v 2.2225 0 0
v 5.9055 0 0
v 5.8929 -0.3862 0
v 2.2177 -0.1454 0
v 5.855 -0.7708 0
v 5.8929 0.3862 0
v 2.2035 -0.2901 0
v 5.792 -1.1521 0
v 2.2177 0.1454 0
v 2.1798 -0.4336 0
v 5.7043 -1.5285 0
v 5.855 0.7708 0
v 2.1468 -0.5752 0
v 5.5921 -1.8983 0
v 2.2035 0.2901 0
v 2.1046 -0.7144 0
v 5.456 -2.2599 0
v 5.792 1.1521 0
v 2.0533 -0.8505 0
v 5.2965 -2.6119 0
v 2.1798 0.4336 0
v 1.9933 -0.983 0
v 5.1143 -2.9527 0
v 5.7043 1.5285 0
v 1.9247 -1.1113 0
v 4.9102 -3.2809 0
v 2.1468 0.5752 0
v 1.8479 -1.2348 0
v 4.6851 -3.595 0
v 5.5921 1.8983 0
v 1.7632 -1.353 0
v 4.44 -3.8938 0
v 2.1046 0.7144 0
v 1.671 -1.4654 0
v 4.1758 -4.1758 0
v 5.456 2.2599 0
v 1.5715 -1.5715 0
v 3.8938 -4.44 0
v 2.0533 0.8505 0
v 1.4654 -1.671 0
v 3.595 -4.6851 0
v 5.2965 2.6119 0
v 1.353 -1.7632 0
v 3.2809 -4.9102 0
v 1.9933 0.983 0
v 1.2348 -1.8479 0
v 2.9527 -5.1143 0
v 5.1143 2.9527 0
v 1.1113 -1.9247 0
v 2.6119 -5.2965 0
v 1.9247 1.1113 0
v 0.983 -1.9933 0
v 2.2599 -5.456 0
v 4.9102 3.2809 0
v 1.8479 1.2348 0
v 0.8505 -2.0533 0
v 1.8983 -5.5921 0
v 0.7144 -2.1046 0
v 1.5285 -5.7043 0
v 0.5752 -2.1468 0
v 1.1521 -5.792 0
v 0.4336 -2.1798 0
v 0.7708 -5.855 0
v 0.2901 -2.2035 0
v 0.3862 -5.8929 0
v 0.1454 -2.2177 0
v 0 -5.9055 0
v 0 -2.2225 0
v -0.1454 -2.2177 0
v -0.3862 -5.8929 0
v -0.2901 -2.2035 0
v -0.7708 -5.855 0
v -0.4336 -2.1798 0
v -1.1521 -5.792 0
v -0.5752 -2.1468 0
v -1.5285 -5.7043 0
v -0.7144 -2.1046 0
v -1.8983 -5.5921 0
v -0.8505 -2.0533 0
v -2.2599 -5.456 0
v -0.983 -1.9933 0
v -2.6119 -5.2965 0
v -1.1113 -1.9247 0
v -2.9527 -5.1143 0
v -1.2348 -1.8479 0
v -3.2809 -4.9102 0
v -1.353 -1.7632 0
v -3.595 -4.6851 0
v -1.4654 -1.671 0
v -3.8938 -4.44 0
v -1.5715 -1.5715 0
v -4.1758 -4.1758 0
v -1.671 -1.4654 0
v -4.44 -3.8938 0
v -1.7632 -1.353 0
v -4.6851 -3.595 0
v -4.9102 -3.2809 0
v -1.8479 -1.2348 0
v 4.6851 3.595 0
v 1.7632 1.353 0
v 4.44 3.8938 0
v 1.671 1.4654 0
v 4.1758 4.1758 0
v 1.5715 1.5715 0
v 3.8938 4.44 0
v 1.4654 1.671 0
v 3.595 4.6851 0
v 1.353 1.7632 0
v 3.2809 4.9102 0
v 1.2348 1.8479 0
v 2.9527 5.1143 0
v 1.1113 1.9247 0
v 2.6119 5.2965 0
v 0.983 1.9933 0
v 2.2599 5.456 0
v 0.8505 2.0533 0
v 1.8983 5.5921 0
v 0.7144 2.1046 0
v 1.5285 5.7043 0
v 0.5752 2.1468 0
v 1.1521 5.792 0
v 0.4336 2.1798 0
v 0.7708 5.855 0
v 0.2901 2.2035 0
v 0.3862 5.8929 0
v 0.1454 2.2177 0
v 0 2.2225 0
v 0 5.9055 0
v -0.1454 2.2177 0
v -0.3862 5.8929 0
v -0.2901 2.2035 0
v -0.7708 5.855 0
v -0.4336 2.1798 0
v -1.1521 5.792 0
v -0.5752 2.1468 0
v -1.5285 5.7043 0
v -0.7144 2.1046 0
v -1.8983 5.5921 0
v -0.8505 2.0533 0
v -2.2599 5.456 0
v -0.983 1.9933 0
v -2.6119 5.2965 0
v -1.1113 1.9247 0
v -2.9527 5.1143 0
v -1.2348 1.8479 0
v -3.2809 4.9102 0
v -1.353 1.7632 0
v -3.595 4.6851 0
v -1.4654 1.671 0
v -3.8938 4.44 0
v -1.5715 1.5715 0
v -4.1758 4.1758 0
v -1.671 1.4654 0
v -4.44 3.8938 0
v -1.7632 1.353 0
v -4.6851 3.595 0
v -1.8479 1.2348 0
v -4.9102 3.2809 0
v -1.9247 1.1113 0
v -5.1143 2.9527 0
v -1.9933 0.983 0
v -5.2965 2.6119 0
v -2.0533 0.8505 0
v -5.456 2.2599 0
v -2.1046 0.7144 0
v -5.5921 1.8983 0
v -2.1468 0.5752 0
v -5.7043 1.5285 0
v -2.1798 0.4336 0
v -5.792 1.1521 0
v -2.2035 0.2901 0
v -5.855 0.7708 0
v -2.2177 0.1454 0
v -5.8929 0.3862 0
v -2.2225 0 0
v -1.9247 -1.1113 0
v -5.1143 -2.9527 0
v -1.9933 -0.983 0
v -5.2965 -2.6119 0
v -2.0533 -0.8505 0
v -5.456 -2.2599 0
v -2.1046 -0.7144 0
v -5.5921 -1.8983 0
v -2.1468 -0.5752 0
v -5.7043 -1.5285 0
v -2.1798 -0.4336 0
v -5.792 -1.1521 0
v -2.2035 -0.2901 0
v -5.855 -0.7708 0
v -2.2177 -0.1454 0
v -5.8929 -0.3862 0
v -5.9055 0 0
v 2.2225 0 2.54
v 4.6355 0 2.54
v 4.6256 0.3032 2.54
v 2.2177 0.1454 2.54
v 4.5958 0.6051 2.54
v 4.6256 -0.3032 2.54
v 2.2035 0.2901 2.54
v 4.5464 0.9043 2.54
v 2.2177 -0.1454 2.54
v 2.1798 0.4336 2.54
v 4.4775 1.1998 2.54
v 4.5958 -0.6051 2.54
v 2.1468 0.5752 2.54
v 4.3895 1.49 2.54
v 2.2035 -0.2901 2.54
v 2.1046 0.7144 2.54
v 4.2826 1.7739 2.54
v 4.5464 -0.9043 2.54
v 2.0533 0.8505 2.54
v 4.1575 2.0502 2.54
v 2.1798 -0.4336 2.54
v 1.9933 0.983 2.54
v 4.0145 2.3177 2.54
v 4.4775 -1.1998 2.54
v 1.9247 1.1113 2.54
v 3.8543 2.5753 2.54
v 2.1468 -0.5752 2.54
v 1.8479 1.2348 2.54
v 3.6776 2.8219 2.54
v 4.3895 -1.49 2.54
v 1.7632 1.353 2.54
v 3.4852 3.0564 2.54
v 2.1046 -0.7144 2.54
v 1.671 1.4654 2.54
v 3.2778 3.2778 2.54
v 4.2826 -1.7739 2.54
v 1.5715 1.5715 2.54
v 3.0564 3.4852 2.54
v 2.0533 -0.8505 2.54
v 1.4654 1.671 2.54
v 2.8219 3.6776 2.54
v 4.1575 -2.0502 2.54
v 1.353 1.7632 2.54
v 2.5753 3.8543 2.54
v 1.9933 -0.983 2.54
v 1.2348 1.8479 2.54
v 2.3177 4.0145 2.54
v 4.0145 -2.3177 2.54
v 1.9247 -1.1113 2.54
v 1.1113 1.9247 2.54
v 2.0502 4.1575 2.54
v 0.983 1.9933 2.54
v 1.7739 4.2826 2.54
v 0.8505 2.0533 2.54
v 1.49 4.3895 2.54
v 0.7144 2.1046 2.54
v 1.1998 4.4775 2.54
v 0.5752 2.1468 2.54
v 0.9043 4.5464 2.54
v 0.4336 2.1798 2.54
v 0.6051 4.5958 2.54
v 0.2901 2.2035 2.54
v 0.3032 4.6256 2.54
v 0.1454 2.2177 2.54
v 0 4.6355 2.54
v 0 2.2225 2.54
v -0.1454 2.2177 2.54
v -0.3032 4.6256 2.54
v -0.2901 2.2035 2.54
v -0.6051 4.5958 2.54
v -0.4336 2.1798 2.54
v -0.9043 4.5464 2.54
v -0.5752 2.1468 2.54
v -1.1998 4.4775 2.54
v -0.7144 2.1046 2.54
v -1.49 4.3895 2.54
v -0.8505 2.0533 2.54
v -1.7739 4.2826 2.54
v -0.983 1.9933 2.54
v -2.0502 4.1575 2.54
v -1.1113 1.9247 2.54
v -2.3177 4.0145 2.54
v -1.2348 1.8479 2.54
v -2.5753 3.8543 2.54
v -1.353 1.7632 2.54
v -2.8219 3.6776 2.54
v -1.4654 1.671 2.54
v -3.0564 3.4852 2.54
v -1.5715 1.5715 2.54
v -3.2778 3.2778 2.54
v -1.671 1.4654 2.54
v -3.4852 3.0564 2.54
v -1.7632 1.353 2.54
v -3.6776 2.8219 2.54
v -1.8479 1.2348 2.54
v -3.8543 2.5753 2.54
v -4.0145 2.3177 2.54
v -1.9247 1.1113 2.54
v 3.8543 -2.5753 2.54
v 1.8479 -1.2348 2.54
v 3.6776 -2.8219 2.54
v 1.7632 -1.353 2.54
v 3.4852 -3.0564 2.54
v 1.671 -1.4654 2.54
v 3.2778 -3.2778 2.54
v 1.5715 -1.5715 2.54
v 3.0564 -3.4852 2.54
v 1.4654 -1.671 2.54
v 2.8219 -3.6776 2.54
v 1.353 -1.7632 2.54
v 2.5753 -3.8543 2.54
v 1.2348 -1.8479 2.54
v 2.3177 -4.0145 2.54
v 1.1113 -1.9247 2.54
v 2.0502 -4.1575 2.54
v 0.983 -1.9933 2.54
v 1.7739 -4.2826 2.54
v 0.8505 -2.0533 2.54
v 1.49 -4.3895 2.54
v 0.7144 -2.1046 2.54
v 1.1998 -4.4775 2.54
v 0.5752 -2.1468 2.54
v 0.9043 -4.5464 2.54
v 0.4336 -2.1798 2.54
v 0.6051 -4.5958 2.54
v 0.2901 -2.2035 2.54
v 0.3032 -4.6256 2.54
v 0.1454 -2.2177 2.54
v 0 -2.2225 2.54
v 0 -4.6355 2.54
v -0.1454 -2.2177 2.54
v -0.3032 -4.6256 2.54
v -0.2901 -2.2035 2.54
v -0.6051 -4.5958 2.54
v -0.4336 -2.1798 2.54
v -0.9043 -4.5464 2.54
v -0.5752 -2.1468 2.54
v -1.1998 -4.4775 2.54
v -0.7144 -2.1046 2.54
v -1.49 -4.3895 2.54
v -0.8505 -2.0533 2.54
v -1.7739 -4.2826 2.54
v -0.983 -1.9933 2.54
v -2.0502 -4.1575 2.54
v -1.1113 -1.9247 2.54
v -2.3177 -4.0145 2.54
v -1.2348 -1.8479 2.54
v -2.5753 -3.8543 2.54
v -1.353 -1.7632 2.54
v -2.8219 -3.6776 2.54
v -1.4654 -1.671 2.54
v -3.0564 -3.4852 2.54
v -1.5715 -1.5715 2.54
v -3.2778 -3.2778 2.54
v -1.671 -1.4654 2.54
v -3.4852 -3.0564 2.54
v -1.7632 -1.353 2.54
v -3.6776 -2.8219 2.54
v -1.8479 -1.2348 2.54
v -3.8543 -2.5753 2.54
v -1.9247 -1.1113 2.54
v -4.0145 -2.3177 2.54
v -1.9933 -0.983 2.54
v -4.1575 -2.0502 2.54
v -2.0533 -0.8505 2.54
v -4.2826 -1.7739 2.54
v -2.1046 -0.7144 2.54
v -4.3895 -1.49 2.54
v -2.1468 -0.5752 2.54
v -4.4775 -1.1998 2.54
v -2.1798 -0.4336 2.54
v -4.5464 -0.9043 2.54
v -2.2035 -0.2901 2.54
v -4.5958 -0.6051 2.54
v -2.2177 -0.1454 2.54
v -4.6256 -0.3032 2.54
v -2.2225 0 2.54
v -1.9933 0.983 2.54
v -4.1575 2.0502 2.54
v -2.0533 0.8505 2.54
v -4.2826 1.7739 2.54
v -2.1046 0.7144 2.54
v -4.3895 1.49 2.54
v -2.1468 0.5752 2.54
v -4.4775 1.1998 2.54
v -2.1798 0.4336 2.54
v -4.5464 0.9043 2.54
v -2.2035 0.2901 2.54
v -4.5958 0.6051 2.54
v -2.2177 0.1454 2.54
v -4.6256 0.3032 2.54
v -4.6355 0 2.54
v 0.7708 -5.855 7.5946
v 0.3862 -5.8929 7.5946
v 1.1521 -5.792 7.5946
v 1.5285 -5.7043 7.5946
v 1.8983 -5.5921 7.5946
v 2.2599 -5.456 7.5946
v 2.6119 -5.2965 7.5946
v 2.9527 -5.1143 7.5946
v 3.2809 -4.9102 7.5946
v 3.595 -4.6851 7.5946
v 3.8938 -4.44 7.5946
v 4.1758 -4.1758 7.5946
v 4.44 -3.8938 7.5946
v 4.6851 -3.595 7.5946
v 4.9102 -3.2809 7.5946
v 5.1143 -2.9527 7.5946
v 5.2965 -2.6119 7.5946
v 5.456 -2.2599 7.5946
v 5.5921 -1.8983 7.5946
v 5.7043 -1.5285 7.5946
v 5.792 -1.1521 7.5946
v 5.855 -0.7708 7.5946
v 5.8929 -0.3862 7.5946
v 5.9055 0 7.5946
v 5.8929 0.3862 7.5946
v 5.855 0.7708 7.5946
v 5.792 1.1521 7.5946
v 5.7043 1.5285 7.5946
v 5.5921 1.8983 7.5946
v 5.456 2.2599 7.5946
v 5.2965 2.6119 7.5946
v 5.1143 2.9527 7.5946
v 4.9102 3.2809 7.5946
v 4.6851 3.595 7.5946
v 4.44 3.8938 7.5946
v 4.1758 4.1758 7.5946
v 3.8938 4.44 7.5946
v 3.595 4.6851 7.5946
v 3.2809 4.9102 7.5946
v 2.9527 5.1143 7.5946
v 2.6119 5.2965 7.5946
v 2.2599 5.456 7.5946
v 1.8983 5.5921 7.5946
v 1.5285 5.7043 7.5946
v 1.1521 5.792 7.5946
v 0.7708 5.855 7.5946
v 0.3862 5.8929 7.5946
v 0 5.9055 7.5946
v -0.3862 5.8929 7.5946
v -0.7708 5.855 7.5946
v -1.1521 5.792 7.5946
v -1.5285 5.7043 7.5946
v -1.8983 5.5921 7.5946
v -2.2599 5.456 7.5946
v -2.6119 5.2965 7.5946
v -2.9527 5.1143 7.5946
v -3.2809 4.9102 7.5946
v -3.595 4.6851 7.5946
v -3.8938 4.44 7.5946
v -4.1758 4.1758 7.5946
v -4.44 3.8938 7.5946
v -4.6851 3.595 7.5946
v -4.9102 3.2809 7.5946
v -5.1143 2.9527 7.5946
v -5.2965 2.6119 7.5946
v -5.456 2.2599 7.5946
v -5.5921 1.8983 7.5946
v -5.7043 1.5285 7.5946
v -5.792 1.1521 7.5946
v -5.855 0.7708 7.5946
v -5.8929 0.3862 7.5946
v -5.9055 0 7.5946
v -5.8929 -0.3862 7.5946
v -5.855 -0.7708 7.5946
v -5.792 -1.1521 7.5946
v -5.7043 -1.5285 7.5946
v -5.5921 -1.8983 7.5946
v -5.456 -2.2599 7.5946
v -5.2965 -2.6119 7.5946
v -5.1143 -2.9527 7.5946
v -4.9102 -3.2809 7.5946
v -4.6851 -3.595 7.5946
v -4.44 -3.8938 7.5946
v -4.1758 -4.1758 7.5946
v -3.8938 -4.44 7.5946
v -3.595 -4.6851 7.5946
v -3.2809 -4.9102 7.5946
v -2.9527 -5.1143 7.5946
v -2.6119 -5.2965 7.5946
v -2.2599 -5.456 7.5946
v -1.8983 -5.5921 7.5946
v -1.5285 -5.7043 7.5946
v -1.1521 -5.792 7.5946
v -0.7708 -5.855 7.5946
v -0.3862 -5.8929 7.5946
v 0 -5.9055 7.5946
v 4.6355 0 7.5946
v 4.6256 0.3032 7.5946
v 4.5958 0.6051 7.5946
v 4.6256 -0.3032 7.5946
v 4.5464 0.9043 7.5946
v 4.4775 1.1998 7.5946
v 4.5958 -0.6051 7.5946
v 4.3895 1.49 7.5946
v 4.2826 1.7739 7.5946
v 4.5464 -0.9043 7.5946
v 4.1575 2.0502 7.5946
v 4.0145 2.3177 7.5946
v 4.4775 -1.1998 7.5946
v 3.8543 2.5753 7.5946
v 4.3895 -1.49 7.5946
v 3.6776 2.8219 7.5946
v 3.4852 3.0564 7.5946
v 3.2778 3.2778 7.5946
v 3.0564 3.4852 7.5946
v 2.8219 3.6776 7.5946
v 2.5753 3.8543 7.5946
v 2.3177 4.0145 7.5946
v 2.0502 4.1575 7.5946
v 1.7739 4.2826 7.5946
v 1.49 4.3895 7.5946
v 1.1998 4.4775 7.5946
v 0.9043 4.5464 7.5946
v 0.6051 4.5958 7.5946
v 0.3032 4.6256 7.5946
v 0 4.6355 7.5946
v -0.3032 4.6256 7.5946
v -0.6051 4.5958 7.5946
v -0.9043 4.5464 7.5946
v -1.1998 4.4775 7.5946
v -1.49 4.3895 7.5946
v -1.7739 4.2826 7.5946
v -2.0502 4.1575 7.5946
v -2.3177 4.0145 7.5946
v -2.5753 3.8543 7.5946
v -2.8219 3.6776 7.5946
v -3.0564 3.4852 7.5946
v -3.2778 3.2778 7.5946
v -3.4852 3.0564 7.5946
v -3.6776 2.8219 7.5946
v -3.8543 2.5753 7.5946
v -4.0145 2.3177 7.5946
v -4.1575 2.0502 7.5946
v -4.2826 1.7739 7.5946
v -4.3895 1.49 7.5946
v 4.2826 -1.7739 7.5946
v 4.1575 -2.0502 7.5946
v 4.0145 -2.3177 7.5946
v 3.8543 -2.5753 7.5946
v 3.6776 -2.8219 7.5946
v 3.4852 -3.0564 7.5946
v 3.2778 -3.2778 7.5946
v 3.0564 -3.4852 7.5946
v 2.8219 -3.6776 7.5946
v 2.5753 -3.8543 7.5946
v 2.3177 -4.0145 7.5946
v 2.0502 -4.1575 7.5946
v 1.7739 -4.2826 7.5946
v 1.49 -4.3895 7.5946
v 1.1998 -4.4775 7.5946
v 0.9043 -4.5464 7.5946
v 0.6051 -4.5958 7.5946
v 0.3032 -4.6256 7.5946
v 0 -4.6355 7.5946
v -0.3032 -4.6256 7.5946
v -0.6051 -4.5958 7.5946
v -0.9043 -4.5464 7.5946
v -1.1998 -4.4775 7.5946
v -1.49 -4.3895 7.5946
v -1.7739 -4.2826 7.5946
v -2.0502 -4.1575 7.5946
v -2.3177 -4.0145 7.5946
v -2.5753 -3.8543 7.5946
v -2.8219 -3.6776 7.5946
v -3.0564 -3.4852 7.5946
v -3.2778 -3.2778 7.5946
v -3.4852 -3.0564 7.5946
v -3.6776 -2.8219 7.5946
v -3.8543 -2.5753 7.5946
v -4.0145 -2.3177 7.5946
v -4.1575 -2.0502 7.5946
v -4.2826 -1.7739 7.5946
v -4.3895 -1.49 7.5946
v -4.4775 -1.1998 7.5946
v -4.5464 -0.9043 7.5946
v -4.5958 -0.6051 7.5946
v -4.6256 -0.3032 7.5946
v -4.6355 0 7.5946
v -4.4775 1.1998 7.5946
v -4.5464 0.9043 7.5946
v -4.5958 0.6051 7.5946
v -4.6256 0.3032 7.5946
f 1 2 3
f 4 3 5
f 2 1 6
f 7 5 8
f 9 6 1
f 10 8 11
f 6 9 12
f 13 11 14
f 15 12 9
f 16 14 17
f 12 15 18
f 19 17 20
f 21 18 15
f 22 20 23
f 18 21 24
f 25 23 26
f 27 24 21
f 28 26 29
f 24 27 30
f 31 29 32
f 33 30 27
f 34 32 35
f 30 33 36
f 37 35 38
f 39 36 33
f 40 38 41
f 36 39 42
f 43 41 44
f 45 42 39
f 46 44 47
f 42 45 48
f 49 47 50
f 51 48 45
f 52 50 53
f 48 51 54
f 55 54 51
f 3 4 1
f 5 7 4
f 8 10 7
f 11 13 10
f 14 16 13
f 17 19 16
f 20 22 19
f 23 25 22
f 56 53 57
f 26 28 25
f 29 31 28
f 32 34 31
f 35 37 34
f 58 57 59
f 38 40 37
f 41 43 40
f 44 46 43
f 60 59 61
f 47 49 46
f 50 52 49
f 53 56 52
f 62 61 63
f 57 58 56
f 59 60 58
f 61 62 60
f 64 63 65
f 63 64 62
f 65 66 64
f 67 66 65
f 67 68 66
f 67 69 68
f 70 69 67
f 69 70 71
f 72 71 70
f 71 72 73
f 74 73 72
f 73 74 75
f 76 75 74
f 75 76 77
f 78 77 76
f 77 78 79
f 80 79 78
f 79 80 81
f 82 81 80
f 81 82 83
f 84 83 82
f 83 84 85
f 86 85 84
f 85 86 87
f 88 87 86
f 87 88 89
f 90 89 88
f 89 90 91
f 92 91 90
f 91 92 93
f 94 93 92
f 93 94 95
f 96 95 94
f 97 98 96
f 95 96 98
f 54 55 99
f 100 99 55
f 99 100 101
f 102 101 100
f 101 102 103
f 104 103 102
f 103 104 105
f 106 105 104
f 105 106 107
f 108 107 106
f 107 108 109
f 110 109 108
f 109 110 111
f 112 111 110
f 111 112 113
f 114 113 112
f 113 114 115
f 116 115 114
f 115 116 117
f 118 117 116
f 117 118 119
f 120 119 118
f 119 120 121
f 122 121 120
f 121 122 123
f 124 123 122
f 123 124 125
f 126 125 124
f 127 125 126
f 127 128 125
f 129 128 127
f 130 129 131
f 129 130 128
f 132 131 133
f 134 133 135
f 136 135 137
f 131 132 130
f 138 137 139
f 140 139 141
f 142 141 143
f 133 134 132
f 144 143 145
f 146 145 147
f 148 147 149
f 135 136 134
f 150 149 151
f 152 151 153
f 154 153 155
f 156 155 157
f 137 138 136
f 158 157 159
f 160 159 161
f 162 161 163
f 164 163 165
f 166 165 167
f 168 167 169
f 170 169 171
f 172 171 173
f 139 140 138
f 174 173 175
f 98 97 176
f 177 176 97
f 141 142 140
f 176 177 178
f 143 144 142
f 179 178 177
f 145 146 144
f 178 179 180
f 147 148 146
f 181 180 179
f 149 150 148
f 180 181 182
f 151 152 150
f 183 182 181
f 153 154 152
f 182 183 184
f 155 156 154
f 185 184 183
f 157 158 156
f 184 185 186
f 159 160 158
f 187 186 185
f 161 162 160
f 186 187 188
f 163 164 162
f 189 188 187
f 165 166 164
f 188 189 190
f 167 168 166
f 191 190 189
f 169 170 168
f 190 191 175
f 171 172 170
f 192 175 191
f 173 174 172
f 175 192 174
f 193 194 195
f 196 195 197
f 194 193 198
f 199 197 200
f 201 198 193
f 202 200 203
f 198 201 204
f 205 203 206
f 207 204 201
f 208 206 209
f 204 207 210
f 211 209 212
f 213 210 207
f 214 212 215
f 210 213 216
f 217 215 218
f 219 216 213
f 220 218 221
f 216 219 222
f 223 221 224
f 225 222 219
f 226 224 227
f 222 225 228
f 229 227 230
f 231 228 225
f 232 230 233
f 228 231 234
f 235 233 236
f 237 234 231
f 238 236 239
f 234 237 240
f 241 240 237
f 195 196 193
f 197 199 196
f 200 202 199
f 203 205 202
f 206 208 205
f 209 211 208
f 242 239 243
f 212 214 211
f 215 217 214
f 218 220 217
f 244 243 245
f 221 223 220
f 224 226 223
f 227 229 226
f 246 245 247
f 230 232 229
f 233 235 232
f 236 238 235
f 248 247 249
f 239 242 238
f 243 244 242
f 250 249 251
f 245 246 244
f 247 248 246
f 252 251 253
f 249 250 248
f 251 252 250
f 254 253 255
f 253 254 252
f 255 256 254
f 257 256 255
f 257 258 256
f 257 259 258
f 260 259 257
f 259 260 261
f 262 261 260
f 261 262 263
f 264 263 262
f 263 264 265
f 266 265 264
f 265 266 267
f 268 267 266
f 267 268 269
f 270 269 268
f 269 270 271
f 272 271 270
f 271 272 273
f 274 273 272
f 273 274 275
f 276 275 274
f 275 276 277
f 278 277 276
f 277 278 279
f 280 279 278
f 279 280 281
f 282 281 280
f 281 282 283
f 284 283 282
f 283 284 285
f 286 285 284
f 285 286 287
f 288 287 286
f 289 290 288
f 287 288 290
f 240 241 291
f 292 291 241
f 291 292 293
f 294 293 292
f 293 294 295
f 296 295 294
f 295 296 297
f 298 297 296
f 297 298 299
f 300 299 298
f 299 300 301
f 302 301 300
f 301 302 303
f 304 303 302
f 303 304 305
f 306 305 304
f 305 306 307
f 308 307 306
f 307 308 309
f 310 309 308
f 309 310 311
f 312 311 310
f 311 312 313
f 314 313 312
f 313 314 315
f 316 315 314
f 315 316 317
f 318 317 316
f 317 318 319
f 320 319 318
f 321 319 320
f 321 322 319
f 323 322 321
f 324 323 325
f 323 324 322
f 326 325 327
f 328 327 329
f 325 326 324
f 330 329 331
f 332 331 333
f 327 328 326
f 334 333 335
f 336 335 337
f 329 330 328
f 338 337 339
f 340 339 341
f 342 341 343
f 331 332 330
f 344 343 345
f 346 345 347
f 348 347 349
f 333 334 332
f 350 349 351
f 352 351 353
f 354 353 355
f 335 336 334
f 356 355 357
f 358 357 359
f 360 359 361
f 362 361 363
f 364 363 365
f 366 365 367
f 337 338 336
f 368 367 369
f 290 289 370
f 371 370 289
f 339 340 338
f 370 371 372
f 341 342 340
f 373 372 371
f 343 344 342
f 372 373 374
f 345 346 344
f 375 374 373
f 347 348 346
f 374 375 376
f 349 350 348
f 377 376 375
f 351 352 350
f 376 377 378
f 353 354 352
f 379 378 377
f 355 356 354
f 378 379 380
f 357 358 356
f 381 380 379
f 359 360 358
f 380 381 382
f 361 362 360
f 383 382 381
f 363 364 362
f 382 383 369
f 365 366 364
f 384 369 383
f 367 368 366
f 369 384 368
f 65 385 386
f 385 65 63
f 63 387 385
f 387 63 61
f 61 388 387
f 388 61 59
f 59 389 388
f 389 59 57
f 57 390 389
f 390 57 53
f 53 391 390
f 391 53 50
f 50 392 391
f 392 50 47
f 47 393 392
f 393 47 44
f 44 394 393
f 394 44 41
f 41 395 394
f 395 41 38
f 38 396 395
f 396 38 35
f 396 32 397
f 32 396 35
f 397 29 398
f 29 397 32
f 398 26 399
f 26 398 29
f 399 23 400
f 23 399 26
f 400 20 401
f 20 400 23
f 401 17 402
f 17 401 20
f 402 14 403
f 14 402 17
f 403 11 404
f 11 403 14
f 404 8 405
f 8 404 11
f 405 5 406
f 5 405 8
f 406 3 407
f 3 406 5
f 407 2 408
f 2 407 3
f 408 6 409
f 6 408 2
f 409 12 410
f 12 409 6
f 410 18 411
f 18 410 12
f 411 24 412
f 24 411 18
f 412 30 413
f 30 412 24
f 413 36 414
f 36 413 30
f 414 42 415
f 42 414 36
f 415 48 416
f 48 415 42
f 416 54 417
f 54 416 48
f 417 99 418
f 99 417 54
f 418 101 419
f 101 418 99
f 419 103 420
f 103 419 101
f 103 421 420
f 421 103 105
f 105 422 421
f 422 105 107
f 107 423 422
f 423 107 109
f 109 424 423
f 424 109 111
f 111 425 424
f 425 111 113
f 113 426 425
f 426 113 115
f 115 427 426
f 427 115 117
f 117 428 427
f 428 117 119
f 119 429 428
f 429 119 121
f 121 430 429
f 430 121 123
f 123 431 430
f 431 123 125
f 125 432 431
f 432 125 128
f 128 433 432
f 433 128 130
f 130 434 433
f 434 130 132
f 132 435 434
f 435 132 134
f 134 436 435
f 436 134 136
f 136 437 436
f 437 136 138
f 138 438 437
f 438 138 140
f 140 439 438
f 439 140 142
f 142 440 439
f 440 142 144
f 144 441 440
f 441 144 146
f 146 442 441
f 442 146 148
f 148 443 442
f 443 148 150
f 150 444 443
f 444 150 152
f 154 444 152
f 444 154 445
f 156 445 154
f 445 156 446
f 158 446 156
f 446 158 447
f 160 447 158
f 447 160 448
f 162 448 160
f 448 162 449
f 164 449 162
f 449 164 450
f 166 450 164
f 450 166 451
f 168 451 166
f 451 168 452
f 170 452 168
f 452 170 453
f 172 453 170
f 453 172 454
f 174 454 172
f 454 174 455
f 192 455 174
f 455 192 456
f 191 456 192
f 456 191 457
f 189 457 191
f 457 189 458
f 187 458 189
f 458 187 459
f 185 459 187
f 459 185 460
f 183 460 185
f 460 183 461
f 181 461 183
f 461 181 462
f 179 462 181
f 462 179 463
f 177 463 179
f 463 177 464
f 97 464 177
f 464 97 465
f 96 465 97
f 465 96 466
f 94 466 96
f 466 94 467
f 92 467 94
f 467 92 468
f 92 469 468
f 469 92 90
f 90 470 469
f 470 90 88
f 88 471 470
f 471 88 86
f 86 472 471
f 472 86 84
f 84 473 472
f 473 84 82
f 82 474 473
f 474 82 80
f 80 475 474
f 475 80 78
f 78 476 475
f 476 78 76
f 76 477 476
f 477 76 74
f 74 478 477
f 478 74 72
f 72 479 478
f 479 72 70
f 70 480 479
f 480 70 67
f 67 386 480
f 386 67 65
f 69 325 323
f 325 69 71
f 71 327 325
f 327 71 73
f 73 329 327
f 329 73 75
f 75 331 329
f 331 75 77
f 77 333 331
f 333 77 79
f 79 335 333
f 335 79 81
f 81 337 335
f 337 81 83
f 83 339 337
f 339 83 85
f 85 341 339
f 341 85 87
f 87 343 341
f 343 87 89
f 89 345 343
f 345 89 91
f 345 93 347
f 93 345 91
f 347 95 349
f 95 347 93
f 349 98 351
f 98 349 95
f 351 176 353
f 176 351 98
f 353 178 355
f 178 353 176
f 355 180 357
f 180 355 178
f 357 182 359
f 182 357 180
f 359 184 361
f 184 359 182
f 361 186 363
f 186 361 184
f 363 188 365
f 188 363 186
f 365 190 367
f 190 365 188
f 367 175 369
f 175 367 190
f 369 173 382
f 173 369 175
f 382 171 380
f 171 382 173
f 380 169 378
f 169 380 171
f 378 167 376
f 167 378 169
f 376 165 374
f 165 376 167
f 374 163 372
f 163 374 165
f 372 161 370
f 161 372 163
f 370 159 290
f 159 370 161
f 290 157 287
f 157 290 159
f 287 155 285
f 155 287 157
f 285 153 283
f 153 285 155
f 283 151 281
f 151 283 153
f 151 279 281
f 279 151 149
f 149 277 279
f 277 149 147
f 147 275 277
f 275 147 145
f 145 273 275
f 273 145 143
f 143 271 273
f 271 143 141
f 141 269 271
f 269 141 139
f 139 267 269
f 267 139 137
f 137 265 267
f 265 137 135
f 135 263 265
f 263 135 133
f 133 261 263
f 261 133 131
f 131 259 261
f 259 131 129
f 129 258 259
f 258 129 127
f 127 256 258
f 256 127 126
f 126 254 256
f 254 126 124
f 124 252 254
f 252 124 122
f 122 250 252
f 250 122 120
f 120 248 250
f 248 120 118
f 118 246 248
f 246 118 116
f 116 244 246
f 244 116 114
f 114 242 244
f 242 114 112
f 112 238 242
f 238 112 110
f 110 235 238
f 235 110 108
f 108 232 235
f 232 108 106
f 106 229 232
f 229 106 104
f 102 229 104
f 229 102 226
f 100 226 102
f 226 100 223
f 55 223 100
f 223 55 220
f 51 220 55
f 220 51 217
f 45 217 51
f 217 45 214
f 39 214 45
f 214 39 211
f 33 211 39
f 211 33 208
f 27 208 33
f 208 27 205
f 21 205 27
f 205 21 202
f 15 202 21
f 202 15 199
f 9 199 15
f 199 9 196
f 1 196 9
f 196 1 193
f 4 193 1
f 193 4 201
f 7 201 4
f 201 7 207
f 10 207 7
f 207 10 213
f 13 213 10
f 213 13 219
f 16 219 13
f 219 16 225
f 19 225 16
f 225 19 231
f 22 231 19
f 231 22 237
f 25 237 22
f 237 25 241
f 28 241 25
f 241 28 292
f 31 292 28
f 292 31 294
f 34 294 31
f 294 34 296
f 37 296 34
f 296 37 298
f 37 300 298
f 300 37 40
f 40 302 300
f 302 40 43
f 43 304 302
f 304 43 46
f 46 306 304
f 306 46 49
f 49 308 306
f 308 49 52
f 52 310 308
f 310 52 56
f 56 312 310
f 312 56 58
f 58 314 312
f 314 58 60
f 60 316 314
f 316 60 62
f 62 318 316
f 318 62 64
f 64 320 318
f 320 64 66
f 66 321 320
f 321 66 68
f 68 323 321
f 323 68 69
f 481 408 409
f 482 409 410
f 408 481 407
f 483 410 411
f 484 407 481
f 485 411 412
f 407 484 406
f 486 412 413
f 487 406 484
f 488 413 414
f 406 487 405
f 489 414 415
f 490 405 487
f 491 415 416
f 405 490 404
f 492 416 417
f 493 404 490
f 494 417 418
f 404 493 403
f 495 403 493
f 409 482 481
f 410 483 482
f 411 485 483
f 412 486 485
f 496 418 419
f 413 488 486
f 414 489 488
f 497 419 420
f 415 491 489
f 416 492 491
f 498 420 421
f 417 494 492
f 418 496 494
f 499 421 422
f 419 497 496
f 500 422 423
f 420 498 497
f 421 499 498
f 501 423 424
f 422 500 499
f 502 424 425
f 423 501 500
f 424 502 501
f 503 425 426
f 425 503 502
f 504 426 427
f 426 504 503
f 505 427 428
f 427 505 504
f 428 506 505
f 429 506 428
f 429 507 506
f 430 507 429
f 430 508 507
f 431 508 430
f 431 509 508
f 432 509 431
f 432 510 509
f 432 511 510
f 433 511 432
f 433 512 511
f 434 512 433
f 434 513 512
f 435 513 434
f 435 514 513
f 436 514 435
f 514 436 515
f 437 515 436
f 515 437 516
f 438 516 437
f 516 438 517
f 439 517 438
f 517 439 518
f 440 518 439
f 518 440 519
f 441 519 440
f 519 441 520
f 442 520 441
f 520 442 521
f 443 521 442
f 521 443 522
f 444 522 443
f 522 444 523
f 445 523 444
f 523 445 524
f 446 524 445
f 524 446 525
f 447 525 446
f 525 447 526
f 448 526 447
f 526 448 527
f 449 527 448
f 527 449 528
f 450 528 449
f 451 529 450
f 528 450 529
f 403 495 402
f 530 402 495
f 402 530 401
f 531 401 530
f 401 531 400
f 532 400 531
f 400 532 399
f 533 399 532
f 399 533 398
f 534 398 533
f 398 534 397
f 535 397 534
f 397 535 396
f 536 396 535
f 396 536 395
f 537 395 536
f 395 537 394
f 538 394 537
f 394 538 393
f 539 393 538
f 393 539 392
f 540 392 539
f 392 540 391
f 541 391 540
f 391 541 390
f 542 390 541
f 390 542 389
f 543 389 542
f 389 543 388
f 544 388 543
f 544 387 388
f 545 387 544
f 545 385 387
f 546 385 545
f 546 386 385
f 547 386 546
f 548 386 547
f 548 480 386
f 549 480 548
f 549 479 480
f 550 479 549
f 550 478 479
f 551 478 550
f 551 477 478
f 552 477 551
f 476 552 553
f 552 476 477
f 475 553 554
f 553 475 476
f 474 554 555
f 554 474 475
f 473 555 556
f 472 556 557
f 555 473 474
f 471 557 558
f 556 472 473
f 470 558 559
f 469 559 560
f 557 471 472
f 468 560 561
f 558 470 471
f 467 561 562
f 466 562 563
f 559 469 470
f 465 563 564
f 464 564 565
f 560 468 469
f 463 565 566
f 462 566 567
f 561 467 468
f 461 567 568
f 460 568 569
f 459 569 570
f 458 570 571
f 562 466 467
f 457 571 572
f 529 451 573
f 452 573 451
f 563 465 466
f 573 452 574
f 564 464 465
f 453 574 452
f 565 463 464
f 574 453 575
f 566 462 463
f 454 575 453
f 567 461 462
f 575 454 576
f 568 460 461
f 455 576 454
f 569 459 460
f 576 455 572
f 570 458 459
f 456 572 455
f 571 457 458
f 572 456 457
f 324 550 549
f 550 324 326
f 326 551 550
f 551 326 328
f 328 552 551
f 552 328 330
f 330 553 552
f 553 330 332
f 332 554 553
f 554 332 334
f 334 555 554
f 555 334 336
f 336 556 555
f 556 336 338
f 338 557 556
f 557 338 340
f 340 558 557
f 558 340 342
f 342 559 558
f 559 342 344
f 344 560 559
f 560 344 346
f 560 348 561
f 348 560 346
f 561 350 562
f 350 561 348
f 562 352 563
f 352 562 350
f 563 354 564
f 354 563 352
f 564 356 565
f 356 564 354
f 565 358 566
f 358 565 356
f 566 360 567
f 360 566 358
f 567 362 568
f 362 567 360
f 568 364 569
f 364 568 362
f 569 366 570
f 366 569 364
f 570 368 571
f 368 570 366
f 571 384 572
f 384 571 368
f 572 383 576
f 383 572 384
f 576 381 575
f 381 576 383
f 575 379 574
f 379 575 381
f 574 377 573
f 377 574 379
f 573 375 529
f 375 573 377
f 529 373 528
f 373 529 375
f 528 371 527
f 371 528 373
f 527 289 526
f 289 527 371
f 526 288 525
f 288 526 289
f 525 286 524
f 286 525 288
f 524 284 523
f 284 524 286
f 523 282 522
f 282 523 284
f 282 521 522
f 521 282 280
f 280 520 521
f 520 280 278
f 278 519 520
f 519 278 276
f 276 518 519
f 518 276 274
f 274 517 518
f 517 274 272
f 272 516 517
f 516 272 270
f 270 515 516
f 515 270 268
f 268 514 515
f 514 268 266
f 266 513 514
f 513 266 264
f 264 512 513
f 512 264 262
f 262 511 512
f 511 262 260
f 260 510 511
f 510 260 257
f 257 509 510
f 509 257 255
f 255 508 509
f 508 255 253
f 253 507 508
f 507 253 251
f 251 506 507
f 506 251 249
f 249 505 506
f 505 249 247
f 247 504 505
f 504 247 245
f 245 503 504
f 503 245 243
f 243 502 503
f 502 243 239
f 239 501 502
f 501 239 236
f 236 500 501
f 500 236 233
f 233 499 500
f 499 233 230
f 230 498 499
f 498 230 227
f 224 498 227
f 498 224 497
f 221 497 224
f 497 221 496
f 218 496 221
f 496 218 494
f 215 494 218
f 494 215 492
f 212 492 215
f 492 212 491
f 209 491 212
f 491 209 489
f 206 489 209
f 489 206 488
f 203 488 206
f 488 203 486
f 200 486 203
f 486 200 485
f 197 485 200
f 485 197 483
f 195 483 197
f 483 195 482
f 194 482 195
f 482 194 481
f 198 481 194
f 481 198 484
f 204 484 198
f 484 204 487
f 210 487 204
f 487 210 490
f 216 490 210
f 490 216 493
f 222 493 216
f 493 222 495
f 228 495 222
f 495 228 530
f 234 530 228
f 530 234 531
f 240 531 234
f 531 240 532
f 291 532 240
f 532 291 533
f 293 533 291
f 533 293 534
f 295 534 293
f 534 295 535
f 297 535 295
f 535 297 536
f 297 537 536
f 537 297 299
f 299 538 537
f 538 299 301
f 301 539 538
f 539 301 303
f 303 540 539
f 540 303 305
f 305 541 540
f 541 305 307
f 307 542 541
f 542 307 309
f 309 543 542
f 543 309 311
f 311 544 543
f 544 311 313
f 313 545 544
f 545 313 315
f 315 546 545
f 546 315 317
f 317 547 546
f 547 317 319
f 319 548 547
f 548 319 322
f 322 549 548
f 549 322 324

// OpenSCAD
ViewScale = [0.0254, 0.0254, 0.0254];

module case()
{
    linear_extrude(100)
    difference()
    {
        circle(465/2, $fn=96);
        circle(175/2, $fn=96);
    }

    translate([0, 0, 99])
    linear_extrude(200)
    difference()
    {
        circle(465/2, $fn=96);
        circle(365/2, $fn=96);
    }
}

module forViewing()
{
    case();
}

module forPrinting()
{
}

scale(ViewScale)
{
    forViewing();
}
